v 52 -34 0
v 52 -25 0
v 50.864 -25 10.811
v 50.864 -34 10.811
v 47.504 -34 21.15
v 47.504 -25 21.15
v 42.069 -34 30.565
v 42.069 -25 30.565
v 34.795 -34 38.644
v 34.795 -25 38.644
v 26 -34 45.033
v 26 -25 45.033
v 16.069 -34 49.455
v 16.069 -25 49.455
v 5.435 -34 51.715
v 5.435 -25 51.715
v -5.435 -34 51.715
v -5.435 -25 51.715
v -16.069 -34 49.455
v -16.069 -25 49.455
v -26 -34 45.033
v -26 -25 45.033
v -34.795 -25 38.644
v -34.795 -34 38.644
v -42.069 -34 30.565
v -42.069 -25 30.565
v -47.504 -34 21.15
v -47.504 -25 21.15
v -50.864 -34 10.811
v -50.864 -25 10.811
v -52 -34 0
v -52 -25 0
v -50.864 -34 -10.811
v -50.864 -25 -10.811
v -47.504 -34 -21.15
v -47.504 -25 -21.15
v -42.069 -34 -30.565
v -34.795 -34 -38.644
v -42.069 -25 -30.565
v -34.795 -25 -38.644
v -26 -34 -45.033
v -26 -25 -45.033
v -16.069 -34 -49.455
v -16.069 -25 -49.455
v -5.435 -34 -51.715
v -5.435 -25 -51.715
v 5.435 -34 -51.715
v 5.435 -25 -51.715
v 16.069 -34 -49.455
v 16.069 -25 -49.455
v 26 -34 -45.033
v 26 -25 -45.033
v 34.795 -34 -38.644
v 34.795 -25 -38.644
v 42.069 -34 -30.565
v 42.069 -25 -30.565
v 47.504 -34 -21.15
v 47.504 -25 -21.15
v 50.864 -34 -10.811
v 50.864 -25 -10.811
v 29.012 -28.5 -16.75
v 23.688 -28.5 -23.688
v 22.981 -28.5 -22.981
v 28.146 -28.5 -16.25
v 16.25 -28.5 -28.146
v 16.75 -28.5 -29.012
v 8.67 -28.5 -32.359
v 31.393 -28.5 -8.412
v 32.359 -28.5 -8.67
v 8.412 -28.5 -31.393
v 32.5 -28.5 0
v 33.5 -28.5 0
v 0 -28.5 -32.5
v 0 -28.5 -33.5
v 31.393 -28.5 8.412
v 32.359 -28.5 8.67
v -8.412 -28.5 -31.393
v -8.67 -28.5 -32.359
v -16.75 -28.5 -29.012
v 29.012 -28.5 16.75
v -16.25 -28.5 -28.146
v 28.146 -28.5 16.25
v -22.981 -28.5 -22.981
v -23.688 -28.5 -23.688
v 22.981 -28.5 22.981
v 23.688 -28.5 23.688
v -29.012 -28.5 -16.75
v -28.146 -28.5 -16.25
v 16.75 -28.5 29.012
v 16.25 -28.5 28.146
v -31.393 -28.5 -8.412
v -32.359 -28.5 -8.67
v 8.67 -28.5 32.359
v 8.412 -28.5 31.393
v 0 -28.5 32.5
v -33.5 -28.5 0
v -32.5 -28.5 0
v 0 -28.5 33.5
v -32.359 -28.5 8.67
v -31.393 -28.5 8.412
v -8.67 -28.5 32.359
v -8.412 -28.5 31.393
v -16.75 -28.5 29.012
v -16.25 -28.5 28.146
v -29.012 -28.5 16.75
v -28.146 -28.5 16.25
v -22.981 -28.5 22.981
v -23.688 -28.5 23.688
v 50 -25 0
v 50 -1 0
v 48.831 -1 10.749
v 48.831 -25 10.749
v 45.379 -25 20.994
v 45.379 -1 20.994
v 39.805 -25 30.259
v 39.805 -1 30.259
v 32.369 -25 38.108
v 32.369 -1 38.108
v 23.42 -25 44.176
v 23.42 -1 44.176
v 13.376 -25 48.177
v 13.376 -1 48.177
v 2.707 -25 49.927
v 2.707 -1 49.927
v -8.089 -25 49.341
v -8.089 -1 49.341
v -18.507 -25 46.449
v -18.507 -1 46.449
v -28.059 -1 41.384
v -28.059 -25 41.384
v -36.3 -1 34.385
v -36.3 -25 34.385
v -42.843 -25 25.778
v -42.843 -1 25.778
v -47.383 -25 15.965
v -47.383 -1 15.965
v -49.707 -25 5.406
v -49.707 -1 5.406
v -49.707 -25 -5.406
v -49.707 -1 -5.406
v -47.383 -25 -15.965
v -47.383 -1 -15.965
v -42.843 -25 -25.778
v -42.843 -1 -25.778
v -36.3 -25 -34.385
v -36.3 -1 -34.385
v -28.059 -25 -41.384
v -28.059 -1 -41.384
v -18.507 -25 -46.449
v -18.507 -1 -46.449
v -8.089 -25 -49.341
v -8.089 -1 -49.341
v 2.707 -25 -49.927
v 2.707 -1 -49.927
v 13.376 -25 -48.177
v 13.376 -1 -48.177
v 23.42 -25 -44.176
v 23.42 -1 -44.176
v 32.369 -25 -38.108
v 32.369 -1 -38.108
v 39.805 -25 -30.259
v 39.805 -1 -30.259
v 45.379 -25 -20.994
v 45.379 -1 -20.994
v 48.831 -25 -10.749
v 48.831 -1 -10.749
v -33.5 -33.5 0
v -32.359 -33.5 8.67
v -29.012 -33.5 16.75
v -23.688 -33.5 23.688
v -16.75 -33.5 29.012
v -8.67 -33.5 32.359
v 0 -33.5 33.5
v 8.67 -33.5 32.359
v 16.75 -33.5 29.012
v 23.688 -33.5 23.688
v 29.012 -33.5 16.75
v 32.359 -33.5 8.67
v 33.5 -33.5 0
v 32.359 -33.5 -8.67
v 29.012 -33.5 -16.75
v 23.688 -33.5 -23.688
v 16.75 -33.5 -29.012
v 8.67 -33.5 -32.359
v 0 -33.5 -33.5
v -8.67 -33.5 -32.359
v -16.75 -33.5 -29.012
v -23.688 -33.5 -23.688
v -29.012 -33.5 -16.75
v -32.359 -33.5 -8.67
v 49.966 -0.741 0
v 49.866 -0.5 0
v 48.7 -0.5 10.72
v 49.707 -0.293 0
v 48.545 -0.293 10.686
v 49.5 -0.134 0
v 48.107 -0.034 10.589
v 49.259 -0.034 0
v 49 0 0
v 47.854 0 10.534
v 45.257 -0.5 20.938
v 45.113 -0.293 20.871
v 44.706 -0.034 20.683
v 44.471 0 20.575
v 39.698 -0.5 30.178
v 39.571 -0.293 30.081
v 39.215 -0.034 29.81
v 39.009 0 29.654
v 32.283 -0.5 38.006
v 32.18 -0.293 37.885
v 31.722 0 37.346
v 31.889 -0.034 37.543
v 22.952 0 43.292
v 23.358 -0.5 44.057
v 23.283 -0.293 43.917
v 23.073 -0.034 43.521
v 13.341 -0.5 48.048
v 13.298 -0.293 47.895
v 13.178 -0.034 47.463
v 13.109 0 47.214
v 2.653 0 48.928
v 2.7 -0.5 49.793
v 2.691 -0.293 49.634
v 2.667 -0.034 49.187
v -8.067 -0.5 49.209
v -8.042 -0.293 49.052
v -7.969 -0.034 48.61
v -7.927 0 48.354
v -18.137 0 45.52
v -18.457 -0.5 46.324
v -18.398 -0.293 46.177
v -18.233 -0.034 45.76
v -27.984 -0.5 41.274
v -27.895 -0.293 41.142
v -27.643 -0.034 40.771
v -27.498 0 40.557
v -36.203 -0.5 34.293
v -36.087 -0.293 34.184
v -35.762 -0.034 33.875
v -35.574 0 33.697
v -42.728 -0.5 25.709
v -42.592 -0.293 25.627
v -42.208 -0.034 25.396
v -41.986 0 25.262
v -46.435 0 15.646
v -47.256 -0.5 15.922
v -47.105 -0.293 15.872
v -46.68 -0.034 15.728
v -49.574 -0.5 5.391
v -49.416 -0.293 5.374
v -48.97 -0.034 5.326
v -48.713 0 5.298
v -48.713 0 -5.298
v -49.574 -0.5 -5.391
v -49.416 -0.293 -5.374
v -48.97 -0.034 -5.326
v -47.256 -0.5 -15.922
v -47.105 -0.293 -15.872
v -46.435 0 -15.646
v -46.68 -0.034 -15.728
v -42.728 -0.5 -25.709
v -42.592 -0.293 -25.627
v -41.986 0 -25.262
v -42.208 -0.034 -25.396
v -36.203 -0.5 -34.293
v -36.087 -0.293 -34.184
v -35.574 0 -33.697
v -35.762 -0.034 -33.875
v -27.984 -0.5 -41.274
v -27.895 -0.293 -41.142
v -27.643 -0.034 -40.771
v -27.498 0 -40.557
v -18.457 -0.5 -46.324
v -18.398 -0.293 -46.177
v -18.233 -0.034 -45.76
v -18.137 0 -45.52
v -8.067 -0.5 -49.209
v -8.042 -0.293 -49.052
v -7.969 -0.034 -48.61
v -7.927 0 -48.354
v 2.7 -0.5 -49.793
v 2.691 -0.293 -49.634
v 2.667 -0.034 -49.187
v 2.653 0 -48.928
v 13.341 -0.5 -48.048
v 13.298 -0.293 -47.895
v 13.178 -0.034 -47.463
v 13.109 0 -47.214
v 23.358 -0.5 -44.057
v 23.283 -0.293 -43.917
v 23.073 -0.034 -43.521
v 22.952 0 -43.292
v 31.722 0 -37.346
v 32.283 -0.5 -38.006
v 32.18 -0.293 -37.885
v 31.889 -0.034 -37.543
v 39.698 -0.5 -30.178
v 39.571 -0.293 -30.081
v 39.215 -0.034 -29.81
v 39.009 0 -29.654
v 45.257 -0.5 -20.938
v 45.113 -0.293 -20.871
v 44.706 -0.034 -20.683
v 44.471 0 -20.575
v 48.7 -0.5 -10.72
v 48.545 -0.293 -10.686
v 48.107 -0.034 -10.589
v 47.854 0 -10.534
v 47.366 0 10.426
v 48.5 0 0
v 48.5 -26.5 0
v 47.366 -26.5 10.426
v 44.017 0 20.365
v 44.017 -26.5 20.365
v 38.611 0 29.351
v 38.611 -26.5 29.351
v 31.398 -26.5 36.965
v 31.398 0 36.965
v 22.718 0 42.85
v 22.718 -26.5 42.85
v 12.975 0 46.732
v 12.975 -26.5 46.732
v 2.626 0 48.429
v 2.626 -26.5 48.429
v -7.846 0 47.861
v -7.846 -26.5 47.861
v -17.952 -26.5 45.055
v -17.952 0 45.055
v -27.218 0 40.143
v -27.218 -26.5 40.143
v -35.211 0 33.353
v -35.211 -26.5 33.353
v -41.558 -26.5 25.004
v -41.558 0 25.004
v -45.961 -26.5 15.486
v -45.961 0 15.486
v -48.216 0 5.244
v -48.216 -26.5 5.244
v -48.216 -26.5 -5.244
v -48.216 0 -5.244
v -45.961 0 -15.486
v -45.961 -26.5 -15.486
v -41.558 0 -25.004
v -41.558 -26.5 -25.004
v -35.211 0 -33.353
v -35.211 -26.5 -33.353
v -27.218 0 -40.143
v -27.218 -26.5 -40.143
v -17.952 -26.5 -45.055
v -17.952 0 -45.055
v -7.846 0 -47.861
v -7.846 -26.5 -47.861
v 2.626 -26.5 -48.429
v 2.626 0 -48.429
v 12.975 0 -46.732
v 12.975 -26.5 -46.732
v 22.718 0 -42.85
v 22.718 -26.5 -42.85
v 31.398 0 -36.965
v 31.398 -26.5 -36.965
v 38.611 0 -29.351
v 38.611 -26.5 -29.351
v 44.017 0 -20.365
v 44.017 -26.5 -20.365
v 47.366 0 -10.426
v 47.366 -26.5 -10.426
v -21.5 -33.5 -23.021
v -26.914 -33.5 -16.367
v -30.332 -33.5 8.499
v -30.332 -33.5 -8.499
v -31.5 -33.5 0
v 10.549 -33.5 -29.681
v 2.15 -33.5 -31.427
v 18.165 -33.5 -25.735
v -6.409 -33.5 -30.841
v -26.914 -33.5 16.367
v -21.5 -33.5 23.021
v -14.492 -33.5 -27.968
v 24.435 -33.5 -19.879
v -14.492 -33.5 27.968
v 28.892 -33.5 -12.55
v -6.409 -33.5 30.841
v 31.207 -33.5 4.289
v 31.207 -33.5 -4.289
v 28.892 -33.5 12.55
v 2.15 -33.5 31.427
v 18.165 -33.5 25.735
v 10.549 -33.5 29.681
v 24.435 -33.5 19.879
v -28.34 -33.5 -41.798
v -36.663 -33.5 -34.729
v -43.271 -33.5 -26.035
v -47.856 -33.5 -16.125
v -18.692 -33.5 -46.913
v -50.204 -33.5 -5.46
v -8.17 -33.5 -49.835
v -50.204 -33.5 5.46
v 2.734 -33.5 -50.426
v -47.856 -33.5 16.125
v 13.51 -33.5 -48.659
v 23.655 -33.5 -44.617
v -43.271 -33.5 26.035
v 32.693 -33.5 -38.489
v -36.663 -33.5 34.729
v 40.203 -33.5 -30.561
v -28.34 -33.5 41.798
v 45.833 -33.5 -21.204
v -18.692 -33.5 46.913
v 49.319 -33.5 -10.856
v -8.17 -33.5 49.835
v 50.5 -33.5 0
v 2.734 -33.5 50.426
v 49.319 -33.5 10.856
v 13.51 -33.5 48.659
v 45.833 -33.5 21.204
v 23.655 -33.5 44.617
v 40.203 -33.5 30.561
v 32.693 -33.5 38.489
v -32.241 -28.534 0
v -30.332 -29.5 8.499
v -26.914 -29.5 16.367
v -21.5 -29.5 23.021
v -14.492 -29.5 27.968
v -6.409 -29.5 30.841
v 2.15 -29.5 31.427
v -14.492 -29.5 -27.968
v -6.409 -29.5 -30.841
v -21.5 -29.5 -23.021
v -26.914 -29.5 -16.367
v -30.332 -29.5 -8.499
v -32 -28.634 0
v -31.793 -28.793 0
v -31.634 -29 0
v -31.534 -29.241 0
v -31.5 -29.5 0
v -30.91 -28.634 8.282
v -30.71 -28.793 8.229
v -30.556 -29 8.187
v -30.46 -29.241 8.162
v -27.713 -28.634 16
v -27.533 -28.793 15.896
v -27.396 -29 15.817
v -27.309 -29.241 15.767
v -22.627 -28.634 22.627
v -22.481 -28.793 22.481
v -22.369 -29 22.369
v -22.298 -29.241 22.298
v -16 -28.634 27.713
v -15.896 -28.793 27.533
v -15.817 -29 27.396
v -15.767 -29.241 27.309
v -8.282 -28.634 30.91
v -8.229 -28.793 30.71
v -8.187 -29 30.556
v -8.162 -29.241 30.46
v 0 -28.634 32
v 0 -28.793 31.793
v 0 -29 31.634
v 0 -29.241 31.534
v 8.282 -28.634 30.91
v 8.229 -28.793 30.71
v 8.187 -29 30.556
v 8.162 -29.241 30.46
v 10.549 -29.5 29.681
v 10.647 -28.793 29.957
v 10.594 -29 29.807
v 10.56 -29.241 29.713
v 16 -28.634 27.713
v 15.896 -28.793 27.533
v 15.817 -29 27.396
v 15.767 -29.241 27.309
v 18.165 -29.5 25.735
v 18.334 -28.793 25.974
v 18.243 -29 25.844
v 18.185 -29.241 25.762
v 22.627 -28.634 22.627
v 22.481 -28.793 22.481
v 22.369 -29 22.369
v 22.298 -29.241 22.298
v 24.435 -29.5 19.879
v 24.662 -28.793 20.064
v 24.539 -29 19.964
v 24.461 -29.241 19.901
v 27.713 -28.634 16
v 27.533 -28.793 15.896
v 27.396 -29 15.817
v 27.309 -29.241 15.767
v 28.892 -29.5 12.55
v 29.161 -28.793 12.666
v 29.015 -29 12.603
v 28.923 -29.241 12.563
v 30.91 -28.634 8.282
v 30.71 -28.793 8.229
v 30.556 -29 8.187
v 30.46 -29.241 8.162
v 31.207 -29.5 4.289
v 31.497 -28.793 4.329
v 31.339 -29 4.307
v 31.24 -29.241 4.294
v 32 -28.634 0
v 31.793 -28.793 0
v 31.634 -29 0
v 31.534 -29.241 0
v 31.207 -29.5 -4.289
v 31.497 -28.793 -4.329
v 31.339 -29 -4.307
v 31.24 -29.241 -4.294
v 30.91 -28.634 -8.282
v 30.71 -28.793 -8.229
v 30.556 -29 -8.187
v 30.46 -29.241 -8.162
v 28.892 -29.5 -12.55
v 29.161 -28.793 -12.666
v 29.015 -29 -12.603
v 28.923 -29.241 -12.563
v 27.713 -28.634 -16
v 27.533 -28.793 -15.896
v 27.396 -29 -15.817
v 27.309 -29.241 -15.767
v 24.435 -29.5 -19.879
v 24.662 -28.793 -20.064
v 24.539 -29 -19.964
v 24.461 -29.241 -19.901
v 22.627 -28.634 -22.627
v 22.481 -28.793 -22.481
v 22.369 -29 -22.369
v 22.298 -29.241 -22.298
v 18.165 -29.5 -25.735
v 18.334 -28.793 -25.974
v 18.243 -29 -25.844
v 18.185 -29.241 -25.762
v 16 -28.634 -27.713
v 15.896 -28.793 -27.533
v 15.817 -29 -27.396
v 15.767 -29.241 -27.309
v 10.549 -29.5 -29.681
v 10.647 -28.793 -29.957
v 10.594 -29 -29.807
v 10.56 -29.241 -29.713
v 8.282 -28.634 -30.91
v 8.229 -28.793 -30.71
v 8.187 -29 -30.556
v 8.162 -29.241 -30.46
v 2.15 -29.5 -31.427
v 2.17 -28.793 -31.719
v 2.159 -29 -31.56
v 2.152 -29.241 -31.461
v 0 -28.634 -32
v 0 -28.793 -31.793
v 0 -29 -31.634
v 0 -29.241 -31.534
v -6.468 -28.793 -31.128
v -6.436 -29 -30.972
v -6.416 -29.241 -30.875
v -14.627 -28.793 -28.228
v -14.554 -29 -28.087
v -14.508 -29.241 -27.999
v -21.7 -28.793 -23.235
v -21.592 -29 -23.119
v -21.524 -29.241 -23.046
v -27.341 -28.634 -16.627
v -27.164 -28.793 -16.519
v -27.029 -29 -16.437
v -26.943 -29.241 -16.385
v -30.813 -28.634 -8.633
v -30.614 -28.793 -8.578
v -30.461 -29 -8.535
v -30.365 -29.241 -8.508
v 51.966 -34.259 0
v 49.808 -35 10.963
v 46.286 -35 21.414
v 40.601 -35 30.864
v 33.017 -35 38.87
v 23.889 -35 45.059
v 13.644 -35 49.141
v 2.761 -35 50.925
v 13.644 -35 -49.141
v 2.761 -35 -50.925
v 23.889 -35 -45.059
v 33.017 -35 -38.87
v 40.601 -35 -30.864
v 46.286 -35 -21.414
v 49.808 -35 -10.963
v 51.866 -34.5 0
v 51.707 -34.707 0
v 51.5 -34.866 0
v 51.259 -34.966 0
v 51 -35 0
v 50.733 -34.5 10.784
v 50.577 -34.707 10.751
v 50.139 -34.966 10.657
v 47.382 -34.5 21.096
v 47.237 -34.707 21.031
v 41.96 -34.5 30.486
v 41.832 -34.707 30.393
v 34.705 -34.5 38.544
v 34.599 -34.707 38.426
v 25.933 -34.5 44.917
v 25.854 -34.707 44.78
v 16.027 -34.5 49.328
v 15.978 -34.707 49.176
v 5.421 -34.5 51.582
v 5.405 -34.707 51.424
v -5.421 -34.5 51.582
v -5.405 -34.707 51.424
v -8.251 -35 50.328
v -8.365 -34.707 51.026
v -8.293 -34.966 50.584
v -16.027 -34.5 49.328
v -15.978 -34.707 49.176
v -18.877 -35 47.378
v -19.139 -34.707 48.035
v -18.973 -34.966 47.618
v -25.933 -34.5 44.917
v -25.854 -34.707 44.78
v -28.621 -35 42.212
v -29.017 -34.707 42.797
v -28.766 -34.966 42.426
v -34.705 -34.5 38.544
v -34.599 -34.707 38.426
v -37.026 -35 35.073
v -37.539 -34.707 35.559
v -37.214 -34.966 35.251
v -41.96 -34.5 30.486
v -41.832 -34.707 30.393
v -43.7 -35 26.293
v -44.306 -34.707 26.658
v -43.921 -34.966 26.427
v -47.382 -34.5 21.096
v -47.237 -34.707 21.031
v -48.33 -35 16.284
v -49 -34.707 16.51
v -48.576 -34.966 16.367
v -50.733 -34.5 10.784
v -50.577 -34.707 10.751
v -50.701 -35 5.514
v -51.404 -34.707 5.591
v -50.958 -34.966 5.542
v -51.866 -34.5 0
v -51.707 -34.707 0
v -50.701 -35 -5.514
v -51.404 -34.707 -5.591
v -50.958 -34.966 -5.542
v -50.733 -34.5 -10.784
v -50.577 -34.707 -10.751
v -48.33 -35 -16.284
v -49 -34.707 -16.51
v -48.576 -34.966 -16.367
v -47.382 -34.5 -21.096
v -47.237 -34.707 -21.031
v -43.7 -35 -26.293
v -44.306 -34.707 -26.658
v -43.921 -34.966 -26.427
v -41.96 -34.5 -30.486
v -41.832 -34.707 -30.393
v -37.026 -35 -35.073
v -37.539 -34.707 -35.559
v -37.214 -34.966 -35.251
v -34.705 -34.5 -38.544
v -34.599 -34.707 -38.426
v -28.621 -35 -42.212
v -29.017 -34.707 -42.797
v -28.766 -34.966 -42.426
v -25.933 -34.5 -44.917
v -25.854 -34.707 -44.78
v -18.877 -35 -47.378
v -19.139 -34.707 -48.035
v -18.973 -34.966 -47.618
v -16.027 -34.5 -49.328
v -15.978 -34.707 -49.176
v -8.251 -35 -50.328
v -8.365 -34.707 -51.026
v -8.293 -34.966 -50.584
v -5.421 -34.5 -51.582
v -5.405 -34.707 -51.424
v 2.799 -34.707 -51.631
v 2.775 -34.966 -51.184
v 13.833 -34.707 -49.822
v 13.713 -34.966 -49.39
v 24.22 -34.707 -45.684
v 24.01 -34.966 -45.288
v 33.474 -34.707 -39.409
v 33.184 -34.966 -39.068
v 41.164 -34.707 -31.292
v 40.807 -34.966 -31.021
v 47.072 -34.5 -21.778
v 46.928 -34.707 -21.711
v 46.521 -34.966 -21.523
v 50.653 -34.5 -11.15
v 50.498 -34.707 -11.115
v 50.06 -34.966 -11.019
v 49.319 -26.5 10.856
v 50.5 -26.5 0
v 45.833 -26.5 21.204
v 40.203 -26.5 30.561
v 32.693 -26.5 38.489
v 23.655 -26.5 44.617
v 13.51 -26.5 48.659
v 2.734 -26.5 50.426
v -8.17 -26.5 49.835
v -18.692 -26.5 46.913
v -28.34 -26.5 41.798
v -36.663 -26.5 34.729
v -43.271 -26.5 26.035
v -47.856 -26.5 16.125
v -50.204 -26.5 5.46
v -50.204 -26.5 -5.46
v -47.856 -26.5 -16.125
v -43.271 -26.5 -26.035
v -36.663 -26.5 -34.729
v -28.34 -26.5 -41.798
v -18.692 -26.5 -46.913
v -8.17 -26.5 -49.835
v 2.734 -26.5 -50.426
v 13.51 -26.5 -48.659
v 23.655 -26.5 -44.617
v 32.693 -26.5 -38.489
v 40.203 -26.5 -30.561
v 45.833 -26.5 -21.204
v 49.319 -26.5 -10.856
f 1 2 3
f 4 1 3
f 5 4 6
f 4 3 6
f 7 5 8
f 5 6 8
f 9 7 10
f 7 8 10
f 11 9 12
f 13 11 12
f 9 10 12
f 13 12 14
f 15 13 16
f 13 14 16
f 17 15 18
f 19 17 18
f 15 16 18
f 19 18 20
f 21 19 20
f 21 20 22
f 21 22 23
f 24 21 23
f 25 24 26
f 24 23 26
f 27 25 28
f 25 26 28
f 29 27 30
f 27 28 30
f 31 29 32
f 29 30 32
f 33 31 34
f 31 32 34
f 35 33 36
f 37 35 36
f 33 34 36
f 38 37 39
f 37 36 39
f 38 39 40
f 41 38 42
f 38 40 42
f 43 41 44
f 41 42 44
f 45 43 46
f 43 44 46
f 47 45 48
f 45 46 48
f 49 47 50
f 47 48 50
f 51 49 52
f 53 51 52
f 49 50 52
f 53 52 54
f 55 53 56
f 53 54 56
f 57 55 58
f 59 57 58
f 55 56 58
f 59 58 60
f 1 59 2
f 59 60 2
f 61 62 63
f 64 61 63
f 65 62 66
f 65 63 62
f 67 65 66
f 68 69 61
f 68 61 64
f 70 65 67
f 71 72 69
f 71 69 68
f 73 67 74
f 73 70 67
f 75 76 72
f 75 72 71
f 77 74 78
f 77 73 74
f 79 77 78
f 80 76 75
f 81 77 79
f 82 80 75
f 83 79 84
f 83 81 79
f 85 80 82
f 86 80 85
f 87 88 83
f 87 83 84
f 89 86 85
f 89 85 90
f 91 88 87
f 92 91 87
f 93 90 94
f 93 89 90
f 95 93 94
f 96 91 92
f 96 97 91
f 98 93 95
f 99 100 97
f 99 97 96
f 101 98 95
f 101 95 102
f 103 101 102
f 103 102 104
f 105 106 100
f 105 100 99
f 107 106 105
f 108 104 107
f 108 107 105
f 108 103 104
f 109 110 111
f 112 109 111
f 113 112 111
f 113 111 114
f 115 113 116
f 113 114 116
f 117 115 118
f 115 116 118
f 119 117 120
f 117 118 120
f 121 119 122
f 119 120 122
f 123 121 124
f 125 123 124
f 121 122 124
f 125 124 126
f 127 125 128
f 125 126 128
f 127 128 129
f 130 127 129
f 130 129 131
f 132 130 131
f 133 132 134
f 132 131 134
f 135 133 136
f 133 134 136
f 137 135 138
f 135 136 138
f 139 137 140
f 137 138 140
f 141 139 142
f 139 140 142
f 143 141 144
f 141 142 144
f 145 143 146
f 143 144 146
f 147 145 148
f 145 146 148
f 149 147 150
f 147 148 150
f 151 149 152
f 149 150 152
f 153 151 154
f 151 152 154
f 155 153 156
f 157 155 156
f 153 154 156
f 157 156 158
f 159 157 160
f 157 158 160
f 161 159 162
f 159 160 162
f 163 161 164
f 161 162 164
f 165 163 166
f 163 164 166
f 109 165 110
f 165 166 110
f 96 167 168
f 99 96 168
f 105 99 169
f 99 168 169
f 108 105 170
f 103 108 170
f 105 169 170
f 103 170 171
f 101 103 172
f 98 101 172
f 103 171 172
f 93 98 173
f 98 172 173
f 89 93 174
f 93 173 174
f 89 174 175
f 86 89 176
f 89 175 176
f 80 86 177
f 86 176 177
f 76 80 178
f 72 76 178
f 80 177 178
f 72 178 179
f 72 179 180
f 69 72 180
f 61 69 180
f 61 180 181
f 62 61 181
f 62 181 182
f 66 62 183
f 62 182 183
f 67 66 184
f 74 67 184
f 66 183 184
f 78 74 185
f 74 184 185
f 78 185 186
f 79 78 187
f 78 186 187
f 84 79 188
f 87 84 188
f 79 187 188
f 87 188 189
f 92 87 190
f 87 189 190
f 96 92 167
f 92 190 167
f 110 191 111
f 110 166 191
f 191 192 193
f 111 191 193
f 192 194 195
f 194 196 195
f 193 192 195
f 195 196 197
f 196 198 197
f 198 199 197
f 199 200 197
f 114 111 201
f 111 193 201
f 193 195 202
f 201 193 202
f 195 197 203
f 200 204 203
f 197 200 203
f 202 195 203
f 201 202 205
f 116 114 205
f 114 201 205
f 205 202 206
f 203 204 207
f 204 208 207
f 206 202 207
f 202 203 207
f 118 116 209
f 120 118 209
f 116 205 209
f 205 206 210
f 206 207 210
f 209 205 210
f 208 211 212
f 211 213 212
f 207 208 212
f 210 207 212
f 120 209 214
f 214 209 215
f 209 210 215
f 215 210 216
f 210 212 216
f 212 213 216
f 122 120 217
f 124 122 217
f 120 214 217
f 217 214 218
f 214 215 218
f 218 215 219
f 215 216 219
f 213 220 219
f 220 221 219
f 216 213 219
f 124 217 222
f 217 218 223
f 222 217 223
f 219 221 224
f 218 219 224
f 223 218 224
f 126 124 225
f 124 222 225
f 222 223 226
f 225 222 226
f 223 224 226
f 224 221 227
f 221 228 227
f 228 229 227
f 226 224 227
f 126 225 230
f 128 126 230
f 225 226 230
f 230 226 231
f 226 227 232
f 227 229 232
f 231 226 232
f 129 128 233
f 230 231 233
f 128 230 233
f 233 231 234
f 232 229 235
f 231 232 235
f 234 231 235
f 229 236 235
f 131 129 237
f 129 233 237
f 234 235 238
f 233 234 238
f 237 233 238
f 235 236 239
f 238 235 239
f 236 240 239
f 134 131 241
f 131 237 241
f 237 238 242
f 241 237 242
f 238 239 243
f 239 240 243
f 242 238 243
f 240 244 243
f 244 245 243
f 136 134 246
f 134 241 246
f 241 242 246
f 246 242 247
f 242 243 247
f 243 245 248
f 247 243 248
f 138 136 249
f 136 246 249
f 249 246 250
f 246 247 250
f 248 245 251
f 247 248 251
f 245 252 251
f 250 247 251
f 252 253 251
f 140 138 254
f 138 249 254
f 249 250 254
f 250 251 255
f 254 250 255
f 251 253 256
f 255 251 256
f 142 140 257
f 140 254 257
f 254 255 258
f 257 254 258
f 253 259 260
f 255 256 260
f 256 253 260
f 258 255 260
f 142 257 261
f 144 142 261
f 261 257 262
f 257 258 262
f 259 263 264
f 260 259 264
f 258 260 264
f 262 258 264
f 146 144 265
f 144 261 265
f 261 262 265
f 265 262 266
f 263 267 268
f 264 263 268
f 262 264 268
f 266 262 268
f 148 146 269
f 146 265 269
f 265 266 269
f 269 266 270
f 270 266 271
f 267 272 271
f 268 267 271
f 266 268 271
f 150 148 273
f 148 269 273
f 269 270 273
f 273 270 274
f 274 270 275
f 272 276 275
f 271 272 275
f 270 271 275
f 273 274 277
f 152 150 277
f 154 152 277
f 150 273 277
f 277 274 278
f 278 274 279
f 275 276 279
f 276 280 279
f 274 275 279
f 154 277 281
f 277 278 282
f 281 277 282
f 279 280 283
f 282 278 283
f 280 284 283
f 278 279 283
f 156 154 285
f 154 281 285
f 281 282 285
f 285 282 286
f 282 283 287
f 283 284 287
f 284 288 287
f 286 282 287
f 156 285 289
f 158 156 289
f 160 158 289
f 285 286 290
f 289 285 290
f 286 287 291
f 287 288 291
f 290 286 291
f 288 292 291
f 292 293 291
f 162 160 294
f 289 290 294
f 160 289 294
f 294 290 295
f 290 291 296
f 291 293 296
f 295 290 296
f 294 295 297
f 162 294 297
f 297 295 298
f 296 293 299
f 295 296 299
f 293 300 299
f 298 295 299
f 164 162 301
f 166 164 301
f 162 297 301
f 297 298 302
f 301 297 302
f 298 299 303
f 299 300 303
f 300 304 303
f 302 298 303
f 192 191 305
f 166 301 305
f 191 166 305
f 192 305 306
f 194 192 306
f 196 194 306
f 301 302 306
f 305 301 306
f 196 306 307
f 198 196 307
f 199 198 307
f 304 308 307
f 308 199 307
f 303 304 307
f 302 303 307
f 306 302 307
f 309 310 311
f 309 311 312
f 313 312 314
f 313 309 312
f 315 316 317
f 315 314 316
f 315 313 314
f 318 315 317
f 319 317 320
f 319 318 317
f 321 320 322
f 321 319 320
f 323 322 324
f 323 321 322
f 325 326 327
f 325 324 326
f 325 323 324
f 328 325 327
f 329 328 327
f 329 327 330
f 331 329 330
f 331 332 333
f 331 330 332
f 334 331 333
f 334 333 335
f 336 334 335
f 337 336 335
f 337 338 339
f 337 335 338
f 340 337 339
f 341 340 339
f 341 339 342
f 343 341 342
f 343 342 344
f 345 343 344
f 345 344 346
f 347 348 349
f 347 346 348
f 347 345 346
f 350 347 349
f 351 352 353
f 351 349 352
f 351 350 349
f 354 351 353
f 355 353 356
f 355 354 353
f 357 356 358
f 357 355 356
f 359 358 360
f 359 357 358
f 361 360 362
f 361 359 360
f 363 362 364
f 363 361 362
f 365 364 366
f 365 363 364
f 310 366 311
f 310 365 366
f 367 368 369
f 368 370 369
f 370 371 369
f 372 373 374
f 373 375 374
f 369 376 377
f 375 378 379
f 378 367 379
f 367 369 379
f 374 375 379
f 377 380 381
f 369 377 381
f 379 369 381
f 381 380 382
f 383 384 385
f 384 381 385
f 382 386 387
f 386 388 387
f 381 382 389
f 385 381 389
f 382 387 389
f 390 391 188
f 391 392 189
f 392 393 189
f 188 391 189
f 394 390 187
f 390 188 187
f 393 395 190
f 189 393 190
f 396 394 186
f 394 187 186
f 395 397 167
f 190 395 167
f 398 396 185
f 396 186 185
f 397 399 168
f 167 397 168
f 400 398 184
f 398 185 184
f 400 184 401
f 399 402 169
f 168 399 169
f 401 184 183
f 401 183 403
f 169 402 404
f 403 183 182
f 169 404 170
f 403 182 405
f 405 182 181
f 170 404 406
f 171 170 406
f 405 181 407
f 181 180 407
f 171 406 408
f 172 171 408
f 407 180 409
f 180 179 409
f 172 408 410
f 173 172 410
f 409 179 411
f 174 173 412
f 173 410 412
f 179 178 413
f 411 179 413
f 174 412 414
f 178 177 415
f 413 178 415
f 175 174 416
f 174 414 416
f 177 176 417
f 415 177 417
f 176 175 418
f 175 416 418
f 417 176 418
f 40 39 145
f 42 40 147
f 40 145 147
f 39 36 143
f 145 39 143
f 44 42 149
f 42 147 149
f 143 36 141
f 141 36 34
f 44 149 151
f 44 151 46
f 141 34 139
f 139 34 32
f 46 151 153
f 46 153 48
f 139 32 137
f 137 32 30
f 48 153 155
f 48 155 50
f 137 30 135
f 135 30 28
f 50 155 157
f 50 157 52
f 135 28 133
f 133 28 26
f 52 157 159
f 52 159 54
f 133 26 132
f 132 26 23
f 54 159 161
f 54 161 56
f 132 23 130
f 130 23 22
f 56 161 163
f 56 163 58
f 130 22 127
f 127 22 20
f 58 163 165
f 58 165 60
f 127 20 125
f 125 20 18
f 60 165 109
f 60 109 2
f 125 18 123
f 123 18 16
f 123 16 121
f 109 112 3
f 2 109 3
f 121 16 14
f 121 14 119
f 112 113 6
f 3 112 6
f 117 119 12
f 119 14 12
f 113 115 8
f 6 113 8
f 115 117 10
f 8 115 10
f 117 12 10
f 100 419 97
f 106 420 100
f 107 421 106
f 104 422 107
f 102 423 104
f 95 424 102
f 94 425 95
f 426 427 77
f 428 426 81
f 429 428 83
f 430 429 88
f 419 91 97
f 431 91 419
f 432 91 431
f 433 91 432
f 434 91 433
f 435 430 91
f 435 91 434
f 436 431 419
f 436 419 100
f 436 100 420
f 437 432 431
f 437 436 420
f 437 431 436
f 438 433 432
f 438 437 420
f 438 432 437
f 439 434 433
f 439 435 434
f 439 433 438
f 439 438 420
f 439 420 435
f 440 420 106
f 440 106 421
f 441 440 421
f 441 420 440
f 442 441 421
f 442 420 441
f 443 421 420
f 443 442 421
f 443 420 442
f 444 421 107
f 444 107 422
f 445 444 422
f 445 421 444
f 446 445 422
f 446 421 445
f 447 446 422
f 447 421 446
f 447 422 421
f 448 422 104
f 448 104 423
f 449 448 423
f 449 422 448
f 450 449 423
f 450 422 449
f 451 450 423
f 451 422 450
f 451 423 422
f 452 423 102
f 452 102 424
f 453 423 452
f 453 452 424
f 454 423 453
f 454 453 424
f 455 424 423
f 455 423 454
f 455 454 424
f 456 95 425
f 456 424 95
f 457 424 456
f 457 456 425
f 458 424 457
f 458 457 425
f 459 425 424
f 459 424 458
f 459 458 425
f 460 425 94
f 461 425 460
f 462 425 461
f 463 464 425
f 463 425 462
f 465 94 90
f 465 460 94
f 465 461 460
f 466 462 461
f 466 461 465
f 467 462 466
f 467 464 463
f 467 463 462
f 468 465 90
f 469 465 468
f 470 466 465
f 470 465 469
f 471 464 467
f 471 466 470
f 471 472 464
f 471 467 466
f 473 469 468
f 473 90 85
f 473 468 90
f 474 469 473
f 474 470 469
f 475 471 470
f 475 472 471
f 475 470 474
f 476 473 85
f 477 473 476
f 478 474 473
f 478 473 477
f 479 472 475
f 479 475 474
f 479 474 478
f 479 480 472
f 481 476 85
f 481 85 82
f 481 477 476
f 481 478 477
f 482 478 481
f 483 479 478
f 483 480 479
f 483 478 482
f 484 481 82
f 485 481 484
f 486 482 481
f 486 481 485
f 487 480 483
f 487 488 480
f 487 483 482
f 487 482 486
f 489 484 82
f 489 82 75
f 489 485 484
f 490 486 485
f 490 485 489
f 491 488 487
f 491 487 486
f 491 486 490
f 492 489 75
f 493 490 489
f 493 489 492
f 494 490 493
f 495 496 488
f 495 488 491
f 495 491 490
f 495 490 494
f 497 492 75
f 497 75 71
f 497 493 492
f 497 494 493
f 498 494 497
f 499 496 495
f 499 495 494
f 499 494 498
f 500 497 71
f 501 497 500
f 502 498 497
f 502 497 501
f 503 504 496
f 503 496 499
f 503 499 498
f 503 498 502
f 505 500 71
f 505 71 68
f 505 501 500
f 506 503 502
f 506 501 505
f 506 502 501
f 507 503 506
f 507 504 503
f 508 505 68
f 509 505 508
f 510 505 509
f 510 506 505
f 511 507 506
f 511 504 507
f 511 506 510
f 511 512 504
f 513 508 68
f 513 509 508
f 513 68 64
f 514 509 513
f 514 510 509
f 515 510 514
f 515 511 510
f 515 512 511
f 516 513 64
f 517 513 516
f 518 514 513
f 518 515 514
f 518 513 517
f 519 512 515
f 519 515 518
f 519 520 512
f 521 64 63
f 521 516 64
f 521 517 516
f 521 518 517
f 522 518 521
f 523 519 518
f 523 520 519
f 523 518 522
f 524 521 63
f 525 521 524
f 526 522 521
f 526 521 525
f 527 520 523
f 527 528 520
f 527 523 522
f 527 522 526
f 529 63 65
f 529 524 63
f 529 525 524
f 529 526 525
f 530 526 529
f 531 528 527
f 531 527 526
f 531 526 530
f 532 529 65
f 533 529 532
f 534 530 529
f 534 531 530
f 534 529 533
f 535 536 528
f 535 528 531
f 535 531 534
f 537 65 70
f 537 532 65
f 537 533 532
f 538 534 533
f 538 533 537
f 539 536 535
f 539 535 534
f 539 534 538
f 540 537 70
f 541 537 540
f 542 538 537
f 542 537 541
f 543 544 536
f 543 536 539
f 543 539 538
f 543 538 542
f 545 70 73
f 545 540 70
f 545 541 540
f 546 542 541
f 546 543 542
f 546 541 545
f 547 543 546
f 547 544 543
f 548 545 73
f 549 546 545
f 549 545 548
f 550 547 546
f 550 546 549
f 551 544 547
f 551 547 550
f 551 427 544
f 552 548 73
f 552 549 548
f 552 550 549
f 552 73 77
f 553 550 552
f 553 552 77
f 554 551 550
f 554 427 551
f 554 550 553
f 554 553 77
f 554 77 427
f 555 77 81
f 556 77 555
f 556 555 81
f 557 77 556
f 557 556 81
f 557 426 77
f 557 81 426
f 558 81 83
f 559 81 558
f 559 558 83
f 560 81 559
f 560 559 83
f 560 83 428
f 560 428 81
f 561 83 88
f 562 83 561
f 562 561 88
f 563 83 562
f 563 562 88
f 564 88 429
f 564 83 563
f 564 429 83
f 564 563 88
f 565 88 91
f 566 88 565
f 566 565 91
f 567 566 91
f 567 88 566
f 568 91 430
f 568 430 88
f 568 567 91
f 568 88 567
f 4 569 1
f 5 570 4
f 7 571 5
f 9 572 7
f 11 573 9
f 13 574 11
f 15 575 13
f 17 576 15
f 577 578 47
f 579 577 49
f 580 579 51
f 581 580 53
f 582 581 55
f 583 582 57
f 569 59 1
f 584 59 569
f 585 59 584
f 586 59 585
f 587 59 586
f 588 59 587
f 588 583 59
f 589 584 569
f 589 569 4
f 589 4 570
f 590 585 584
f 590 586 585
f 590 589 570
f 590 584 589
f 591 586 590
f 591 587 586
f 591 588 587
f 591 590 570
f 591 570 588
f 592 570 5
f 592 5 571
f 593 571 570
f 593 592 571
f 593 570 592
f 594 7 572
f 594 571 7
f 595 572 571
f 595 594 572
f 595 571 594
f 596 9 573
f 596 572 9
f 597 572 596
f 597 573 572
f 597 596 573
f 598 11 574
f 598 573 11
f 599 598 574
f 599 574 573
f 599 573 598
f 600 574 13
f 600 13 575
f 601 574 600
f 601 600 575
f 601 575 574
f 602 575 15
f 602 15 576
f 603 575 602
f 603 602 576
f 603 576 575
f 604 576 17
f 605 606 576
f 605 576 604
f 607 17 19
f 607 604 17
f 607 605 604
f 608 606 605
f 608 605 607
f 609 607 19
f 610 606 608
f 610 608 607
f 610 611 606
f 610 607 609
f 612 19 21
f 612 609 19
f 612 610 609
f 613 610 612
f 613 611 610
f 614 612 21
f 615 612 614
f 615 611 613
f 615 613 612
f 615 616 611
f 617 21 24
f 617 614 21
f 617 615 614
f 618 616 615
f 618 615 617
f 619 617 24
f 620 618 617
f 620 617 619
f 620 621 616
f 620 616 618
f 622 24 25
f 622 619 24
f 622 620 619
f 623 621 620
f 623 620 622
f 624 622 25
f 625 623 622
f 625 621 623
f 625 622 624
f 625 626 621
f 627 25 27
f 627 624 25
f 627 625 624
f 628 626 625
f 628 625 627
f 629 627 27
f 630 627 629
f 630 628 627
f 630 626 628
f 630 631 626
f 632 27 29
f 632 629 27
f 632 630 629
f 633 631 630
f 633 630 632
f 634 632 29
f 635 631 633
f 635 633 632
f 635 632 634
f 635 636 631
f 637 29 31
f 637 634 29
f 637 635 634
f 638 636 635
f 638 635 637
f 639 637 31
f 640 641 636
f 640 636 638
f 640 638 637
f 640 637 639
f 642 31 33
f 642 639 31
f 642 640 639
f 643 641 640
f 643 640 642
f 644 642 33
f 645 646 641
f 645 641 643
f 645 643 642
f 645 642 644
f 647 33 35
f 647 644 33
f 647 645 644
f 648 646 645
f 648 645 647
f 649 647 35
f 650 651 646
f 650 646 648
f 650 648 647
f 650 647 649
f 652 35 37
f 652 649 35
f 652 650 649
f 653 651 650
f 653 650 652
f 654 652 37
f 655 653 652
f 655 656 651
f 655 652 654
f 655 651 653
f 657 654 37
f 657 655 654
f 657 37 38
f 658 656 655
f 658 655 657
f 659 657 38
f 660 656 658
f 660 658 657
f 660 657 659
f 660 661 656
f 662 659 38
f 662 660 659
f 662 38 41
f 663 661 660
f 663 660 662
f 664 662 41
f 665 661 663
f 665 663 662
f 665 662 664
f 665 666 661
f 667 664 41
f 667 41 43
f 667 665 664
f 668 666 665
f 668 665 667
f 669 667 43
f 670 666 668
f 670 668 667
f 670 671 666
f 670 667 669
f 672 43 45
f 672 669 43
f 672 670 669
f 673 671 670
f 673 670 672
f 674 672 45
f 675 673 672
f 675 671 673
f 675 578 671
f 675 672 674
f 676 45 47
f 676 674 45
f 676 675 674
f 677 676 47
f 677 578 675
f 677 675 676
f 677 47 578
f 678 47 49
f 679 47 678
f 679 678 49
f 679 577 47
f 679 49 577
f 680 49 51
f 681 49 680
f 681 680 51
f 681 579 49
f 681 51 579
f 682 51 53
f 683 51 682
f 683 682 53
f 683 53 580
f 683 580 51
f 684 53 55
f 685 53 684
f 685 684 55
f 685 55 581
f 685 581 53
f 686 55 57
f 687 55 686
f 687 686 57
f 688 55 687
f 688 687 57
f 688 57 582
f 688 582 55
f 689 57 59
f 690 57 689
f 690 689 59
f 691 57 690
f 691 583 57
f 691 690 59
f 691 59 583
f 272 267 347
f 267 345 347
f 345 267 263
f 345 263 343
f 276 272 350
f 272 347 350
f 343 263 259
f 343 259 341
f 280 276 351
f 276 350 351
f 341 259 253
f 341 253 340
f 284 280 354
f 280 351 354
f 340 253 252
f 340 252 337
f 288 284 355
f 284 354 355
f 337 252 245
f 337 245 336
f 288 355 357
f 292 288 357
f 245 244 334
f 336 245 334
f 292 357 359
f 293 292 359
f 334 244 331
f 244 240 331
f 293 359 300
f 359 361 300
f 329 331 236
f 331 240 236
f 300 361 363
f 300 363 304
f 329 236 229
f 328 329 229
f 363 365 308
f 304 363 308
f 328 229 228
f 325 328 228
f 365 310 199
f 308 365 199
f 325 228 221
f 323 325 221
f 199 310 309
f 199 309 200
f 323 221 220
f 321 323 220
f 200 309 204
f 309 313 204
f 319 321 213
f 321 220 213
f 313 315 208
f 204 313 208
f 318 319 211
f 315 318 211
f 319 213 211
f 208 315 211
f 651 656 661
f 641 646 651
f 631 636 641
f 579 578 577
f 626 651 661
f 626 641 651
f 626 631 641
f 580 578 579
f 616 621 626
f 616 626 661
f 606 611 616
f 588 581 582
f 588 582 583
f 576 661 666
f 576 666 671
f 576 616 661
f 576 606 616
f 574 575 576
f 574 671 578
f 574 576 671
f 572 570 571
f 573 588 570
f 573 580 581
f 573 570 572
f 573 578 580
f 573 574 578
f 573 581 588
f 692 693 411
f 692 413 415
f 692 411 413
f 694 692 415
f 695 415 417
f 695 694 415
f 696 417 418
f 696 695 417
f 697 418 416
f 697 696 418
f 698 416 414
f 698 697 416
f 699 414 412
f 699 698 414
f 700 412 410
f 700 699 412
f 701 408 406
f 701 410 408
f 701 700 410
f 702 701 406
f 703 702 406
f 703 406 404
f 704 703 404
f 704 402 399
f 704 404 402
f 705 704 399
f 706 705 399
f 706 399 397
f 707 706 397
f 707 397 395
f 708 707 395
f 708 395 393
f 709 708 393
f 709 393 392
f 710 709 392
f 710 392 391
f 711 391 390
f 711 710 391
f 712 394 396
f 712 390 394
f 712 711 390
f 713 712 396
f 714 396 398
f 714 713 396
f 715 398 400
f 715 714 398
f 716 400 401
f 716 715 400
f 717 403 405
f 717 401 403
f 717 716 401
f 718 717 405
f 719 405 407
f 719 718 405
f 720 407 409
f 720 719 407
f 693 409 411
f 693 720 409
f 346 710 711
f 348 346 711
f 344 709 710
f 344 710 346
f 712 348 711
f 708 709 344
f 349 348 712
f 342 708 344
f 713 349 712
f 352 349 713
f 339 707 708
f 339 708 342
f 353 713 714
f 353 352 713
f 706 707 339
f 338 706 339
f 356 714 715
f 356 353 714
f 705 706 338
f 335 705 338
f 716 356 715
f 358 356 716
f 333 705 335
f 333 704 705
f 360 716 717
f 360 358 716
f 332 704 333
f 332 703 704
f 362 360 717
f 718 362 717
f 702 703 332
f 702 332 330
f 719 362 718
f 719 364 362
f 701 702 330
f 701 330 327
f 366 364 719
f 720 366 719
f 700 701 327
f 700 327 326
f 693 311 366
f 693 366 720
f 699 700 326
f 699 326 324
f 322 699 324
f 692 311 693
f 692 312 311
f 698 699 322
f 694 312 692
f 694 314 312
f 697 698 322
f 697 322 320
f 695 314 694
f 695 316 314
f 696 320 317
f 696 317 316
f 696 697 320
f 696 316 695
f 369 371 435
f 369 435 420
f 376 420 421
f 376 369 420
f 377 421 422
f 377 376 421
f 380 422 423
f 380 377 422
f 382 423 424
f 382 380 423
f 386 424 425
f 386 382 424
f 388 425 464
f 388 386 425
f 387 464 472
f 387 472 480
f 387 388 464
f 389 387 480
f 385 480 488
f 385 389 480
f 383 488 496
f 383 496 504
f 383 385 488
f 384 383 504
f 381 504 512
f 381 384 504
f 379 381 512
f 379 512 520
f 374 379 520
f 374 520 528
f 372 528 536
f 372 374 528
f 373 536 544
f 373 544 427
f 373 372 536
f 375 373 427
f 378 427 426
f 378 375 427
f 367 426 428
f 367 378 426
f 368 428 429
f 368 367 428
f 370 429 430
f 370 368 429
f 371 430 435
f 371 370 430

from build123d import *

# Parameters (mm, degrees)
F0_R     = 50
F1_DEPTH = 25
F2_R     = 52
F2_R_2   = 50
F3_DEPTH = 10
F5_T     = -1.5
F6_R     = 33.5
F6_R_2   = 31.5
F7_DEPTH = 5
F8_R     = 1


# Not quite as in the source:
# - a feature of the source that left no trace in its solid (it failed there, or was rolled back) is left out


with BuildPart() as f1:
    # F0 (on Front) → F1 (new body)
    with BuildSketch(Plane.XZ):
        Circle(F0_R)
    extrude(amount=F1_DEPTH)

    # F2 (on face) → F3 (join)
    with BuildSketch(Plane.XZ.offset(25)):
        Circle(F2_R)
        Circle(F2_R_2, mode=Mode.SUBTRACT)
        Circle(F2_R_2)
    extrude(amount=F3_DEPTH)

    # F5
    f5_openings = [f1.faces().sort_by_distance(p)[0] for p in [
        (0, 0, 0),
    ]]
    offset(amount=F5_T, openings=f5_openings, kind=Kind.INTERSECTION)

    # F6 (on face) → F7 (join)
    with BuildSketch(Plane(origin=(0, -33.5, 0), x_dir=(-1, 0, 0), z_dir=(0, 1, 0))):
        Circle(F6_R)
        Circle(F6_R_2, mode=Mode.SUBTRACT)
    extrude(amount=F7_DEPTH)

    # F8
    f8_edges = [f1.edges().sort_by_distance(p)[0] for p in [
        (31.5, -28.5, 0),
        (-52, -35, 0),
        (-50, 0, 0),
    ]]
    fillet(f8_edges, radius=F8_R)


solid = f1.part
